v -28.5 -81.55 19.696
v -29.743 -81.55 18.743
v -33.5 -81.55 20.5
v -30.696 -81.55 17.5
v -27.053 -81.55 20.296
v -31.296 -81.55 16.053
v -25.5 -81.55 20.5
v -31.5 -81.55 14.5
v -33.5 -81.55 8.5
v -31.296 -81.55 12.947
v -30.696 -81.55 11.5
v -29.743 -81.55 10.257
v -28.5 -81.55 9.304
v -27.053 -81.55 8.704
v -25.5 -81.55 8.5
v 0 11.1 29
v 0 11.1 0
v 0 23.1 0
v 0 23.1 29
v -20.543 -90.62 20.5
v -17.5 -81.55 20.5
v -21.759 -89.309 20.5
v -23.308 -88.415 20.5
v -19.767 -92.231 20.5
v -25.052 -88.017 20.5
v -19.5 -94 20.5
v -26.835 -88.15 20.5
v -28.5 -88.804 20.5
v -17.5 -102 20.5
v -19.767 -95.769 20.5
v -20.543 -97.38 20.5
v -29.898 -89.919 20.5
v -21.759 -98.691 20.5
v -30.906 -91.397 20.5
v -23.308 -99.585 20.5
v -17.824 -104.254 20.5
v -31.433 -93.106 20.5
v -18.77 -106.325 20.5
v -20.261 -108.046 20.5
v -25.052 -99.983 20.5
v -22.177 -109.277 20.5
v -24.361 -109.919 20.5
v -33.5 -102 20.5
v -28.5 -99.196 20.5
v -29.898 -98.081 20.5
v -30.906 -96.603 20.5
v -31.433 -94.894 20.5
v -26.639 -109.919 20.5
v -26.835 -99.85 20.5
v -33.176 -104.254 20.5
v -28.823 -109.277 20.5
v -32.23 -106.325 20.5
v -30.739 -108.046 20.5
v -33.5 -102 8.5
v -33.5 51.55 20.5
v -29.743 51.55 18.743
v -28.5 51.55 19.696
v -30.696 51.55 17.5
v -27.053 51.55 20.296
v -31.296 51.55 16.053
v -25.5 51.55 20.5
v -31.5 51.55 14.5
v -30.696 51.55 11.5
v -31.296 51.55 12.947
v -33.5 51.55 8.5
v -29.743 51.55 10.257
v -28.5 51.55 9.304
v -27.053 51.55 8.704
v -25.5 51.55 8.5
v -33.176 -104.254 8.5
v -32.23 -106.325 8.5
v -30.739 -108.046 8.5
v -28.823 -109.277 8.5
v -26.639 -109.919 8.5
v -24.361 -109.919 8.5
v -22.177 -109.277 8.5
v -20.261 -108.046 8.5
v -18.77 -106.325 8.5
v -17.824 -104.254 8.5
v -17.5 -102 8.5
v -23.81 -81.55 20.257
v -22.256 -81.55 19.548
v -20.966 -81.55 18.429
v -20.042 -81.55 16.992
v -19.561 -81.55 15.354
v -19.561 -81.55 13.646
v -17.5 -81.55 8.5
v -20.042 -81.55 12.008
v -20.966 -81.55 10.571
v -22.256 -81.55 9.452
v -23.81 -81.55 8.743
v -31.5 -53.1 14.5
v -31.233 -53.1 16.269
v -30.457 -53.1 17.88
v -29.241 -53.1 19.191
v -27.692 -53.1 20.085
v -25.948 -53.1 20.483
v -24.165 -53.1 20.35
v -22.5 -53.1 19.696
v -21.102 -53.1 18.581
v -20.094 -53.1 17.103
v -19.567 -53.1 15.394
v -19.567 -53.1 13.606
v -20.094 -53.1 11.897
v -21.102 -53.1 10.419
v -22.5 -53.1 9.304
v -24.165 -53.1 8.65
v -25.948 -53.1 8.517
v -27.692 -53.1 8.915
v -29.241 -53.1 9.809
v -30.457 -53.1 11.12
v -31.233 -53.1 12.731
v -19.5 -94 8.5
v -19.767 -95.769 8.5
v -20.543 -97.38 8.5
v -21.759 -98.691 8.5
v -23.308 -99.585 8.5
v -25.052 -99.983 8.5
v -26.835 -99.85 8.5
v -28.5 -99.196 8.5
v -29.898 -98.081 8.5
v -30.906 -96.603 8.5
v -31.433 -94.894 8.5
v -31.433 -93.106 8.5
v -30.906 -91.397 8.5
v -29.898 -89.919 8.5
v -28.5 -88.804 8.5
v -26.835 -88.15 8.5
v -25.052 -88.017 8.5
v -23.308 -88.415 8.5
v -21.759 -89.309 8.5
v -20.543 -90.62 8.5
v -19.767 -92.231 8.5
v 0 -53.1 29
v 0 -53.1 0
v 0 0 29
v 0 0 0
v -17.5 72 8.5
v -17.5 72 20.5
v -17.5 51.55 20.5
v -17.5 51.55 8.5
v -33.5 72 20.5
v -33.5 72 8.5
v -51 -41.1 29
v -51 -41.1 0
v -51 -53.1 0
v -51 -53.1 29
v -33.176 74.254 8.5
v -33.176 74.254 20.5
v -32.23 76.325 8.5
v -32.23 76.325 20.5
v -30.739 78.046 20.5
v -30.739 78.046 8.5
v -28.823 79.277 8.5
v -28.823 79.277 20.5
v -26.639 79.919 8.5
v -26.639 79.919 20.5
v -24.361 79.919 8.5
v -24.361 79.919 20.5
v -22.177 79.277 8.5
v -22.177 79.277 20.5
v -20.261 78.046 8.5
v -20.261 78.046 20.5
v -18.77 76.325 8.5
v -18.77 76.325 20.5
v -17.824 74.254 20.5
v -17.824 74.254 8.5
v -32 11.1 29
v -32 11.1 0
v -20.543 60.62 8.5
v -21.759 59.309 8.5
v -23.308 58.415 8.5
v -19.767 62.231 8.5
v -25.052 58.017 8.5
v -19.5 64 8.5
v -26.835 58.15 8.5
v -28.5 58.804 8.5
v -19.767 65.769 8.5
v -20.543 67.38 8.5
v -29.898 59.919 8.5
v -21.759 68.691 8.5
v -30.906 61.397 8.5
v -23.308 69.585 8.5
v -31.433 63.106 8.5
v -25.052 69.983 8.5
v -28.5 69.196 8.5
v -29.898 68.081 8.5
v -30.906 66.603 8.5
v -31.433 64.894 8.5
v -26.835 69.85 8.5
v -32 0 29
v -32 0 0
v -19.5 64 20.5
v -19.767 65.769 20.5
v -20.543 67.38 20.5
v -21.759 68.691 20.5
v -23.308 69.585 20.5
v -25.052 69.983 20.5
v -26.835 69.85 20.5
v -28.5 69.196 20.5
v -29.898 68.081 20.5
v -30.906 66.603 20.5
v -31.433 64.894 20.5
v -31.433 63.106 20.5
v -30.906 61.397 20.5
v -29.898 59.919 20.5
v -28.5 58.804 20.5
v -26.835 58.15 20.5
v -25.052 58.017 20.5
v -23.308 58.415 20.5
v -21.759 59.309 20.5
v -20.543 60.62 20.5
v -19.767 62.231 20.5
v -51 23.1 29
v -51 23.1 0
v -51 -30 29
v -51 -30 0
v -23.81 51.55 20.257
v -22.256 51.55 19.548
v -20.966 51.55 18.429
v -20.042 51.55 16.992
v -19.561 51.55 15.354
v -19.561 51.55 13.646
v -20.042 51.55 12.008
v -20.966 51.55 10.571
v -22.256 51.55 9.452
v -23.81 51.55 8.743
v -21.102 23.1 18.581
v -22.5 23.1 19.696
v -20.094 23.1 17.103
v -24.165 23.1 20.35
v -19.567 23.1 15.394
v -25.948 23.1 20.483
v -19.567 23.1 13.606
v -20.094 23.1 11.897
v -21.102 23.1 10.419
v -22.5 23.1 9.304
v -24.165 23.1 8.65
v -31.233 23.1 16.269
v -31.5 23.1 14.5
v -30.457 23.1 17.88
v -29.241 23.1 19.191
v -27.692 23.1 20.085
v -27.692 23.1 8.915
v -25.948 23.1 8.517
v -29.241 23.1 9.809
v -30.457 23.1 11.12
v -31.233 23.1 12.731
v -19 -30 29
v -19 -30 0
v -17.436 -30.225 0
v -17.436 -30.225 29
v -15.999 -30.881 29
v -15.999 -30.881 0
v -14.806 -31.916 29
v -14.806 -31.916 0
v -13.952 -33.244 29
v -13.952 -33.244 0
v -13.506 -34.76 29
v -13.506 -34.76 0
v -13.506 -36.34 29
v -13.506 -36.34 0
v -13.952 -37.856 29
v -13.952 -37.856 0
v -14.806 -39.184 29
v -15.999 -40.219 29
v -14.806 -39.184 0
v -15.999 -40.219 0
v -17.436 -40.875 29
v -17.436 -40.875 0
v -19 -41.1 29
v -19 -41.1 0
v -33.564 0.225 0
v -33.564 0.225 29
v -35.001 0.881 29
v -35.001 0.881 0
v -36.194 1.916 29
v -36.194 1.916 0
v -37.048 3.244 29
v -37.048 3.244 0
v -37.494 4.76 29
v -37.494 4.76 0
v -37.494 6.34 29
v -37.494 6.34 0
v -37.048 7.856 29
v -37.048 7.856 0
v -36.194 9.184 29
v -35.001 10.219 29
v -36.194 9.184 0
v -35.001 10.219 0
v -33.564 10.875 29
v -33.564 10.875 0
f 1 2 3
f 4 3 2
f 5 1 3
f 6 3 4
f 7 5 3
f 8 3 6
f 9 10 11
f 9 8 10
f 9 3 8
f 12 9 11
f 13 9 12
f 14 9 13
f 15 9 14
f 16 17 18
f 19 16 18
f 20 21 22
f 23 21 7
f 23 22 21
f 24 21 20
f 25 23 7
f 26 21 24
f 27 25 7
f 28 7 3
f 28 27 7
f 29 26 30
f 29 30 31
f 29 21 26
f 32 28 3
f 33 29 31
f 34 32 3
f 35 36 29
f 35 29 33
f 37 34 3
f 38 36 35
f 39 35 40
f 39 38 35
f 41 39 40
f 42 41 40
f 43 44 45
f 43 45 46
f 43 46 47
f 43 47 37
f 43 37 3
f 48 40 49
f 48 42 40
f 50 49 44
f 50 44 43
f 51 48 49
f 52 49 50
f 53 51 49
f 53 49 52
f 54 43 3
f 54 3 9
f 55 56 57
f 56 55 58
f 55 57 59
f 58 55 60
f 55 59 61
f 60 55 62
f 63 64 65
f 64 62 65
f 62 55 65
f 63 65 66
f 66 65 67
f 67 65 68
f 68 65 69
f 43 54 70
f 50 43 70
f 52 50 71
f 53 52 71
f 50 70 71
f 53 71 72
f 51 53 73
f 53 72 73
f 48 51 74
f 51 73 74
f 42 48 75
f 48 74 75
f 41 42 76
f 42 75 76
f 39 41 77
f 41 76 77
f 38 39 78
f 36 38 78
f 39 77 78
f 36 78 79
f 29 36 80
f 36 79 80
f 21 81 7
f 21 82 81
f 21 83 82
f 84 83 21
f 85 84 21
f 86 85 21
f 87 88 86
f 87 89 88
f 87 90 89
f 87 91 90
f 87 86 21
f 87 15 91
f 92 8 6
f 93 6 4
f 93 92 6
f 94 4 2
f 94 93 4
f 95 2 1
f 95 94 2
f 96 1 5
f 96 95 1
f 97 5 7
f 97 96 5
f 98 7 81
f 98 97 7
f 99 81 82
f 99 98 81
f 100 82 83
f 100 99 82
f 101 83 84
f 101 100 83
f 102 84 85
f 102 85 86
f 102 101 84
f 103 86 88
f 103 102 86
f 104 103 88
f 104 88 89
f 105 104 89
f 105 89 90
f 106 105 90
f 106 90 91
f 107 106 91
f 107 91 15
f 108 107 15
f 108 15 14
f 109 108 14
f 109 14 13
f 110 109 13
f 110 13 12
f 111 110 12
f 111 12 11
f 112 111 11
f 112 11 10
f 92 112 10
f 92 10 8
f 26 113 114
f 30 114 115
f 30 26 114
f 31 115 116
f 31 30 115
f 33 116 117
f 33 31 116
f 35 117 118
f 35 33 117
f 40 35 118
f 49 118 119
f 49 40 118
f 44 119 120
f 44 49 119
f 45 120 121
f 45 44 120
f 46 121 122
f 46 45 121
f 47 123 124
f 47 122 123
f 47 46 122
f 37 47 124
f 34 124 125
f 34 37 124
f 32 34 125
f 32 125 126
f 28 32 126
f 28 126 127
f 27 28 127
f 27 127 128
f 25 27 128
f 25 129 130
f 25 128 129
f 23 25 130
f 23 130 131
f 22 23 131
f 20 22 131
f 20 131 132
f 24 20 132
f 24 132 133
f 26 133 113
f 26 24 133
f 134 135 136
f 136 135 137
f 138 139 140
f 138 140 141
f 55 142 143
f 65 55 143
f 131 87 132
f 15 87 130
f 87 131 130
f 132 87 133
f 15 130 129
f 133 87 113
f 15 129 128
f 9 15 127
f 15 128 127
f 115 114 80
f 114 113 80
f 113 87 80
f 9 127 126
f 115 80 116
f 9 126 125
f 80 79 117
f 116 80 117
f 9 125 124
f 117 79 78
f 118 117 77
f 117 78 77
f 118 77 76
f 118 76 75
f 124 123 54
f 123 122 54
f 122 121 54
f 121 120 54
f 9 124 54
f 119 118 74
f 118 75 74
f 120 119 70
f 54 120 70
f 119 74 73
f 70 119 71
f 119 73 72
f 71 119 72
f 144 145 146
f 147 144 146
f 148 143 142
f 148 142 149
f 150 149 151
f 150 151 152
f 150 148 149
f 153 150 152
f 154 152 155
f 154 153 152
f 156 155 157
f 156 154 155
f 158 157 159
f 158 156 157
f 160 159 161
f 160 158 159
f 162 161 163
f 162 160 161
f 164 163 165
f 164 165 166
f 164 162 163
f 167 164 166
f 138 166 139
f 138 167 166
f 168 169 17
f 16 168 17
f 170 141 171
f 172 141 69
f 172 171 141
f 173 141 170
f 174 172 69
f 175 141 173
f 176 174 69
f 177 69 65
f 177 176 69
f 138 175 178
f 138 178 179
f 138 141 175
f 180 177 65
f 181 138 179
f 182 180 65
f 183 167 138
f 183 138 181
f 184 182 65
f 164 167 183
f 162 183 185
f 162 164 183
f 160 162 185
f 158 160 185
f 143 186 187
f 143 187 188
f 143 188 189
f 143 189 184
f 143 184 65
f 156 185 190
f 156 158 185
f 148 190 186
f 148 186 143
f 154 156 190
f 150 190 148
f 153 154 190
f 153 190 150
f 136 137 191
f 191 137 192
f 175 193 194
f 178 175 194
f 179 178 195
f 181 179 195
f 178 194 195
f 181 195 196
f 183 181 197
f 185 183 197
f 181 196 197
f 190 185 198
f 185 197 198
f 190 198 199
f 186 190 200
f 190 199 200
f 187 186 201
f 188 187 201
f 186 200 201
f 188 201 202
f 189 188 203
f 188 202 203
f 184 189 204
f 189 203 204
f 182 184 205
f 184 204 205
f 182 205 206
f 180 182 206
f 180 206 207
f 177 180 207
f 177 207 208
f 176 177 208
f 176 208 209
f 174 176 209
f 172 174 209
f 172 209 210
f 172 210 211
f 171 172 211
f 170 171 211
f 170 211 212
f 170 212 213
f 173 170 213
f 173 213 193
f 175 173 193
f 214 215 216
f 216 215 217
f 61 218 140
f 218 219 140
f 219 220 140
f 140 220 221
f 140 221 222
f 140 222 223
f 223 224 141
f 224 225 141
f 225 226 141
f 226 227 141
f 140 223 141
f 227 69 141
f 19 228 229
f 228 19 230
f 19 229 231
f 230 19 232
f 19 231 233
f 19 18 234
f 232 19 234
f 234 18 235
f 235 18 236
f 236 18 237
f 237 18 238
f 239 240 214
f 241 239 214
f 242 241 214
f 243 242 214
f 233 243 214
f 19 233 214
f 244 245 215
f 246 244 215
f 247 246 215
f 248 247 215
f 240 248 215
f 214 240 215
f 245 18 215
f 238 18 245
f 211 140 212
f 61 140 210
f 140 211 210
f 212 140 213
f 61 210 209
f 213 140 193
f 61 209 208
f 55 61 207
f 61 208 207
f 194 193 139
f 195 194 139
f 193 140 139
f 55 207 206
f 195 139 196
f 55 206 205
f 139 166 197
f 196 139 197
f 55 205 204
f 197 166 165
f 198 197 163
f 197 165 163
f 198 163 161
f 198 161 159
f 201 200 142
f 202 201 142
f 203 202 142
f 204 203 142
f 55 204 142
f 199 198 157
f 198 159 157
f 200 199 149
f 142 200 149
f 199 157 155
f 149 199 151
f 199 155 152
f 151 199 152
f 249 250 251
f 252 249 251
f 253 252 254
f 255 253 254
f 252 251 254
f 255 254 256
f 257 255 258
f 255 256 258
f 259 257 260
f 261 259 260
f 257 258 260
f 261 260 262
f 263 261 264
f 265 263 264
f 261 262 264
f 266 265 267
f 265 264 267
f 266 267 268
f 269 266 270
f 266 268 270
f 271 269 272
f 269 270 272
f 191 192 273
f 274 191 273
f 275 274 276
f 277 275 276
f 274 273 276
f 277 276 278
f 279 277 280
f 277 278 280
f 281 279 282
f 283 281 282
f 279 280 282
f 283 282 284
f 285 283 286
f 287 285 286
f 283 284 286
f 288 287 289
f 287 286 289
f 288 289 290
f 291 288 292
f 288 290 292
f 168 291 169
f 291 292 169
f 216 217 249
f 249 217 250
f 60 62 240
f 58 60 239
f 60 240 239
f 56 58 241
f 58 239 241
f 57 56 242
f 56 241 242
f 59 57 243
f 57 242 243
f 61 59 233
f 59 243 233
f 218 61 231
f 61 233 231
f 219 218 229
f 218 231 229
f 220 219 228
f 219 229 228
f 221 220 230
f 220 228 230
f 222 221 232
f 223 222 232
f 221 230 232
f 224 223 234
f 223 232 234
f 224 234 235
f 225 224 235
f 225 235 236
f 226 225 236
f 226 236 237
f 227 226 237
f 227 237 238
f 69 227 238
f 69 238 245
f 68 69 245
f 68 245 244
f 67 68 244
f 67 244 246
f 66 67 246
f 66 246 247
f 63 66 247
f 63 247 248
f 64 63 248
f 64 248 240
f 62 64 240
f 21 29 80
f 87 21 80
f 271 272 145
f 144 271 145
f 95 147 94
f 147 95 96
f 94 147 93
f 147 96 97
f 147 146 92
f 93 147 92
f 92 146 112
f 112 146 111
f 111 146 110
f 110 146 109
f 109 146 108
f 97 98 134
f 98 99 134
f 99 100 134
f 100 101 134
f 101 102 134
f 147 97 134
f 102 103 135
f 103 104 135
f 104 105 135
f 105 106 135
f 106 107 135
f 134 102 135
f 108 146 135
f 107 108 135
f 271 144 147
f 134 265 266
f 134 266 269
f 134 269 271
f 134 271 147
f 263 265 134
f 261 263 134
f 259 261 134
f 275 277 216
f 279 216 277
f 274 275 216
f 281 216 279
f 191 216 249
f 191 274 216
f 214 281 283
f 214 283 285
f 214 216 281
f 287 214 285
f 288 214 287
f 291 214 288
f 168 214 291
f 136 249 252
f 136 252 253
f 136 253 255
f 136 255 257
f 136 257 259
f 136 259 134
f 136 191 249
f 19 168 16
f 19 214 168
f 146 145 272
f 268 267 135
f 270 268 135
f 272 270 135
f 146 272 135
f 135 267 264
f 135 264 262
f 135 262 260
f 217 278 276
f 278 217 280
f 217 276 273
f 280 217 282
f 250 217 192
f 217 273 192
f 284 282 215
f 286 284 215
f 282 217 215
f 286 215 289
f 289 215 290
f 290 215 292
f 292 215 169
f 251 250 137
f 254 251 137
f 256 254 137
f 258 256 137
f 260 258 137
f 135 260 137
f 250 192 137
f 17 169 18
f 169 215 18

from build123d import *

# Parameters (mm, degrees)
BOSS_EXTRUDE1_DEPTH = 29
SKETCH14_R          = 6
BOSS_EXTRUDE3_DEPTH = 28.45
SKETCH15_W          = 16
SKETCH15_H          = 12
BOSS_EXTRUDE4_DEPTH = 20.45
BOSS_EXTRUDE5_START = -12
BOSS_EXTRUDE5_DEPTH = 12
SKETCH17_R          = 6
CUT_EXTRUDE1_DEPTH  = 98.063123791


with BuildPart() as part:
    # Sketch1 → Boss-Extrude1 (new body)
    with BuildSketch(Plane.XY):
        with BuildLine():
            Line((-51, -30), (-19, -30))
            ThreePointArc((-19, -30), (-13.45, -35.55), (-19, -41.1))
            Line((-19, -41.1), (-51, -41.1))
            Line((-51, -41.1), (-51, -53.1))
            Line((-51, -53.1), (0, -53.1))
            Line((0, -53.1), (0, 0))
            Line((0, 0), (-32, 0))
            ThreePointArc((-32, 0), (-37.55, 5.55), (-32, 11.1))
            Line((-32, 11.1), (0, 11.1))
            Line((0, 11.1), (0, 23.1))
            Line((0, 23.1), (-51, 23.1))
            Line((-51, 23.1), (-51, -30))
        make_face()
    extrude(amount=BOSS_EXTRUDE1_DEPTH)

    # Sketch14 → Boss-Extrude3 (add)
    with BuildSketch(Plane(origin=(0, 23.1, 0), x_dir=(1, 0, 0), z_dir=(0, 1, 0))):
        with Locations(Location((-25.5, -14.5, 0), (0, 0, 180))):
            Circle(SKETCH14_R)
    boss_extrude3 = extrude(amount=BOSS_EXTRUDE3_DEPTH)

    # Sketch15 → Boss-Extrude4 (add)
    with BuildSketch(Plane(origin=(0, 51.55, 0), x_dir=(1, 0, 0), z_dir=(0, 1, 0))):
        with Locations((-25.5, -14.5)):
            Rectangle(SKETCH15_W, SKETCH15_H)
    boss_extrude4 = extrude(amount=BOSS_EXTRUDE4_DEPTH)

    # Sketch16 → Boss-Extrude5 (add)
    with BuildSketch(Plane.XY.offset(20.5).offset(BOSS_EXTRUDE5_START)):
        with BuildLine():
            Line((-17.5, 72), (-33.5, 72))
            ThreePointArc((-33.5, 72), (-25.5, 80), (-17.5, 72))
        make_face()
    boss_extrude5 = extrude(amount=BOSS_EXTRUDE5_DEPTH)

    # Sketch17 → Cut-Extrude1 (cut, through all)
    with BuildSketch(Plane.XY.offset(20.5)):
        with Locations((-25.5, 64)):
            Circle(SKETCH17_R)
    cut_extrude1 = extrude(amount=-CUT_EXTRUDE1_DEPTH, mode=Mode.SUBTRACT)

    # Mirror7: Boss-Extrude3, Boss-Extrude4, Boss-Extrude5, Cut-Extrude1 across plane
    add(boss_extrude3.mirror(Plane.ZX.offset(-15)))
    add(boss_extrude4.mirror(Plane.ZX.offset(-15)))
    add(boss_extrude5.mirror(Plane.ZX.offset(-15)))
    add(cut_extrude1.mirror(Plane.ZX.offset(-15)), mode=Mode.SUBTRACT)


solid = part.part
